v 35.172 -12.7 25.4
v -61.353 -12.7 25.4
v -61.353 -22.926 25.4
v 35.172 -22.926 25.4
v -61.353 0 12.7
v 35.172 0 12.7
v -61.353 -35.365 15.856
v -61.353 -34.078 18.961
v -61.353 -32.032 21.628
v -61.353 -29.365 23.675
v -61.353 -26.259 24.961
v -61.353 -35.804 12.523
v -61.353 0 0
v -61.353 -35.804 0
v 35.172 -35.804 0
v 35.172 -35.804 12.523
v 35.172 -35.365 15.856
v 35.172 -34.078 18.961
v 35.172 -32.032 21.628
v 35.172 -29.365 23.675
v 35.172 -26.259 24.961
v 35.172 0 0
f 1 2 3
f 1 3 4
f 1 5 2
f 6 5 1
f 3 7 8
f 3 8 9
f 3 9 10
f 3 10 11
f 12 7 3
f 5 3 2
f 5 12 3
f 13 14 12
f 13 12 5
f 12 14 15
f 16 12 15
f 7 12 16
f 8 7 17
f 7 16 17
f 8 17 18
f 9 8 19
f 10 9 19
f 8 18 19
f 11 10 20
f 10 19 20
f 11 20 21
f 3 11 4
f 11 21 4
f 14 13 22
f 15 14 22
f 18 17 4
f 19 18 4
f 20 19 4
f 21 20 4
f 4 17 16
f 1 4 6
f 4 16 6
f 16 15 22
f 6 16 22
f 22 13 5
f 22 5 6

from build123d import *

# Parameters (mm, degrees)
F0_W     = 96.524141
F0_H     = 35.803635
F1_DEPTH = 25.4
F2_R     = 12.877415
F3_SIZE  = 12.7


with BuildPart() as f1:
    # F0 (on Top) → F1 (new body)
    with BuildSketch(Plane.XY):
        with Locations((-13.090502, -17.901817)):
            Rectangle(F0_W, F0_H)
    extrude(amount=F1_DEPTH)

    # F2
    f2_edges = [f1.edges().sort_by_distance(p)[0] for p in [
        (-13.090502, -35.803635, 25.4),
    ]]
    fillet(f2_edges, radius=F2_R)

    # F3
    f3_edges = [f1.edges().sort_by_distance(p)[0] for p in [
        (-13.090502, 0, 25.4),
    ]]
    chamfer(f3_edges, length=F3_SIZE)


solid = f1.part
